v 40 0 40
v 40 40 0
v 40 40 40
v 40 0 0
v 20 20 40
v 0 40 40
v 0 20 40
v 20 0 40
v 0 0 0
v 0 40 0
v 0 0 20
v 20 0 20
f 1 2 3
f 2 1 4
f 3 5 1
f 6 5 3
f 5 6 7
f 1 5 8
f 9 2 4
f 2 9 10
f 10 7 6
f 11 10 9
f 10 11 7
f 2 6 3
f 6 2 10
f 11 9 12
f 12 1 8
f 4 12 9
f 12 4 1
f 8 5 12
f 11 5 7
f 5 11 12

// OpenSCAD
difference(){
  cube([40, 40, 40], center=false);
  color([1,0.8,0]) {
    translate([0, 0, 20]){
      rotate([45, 0, 0]){
        cube([20, 30, 20], center=false);
      }
    }
  }
}
